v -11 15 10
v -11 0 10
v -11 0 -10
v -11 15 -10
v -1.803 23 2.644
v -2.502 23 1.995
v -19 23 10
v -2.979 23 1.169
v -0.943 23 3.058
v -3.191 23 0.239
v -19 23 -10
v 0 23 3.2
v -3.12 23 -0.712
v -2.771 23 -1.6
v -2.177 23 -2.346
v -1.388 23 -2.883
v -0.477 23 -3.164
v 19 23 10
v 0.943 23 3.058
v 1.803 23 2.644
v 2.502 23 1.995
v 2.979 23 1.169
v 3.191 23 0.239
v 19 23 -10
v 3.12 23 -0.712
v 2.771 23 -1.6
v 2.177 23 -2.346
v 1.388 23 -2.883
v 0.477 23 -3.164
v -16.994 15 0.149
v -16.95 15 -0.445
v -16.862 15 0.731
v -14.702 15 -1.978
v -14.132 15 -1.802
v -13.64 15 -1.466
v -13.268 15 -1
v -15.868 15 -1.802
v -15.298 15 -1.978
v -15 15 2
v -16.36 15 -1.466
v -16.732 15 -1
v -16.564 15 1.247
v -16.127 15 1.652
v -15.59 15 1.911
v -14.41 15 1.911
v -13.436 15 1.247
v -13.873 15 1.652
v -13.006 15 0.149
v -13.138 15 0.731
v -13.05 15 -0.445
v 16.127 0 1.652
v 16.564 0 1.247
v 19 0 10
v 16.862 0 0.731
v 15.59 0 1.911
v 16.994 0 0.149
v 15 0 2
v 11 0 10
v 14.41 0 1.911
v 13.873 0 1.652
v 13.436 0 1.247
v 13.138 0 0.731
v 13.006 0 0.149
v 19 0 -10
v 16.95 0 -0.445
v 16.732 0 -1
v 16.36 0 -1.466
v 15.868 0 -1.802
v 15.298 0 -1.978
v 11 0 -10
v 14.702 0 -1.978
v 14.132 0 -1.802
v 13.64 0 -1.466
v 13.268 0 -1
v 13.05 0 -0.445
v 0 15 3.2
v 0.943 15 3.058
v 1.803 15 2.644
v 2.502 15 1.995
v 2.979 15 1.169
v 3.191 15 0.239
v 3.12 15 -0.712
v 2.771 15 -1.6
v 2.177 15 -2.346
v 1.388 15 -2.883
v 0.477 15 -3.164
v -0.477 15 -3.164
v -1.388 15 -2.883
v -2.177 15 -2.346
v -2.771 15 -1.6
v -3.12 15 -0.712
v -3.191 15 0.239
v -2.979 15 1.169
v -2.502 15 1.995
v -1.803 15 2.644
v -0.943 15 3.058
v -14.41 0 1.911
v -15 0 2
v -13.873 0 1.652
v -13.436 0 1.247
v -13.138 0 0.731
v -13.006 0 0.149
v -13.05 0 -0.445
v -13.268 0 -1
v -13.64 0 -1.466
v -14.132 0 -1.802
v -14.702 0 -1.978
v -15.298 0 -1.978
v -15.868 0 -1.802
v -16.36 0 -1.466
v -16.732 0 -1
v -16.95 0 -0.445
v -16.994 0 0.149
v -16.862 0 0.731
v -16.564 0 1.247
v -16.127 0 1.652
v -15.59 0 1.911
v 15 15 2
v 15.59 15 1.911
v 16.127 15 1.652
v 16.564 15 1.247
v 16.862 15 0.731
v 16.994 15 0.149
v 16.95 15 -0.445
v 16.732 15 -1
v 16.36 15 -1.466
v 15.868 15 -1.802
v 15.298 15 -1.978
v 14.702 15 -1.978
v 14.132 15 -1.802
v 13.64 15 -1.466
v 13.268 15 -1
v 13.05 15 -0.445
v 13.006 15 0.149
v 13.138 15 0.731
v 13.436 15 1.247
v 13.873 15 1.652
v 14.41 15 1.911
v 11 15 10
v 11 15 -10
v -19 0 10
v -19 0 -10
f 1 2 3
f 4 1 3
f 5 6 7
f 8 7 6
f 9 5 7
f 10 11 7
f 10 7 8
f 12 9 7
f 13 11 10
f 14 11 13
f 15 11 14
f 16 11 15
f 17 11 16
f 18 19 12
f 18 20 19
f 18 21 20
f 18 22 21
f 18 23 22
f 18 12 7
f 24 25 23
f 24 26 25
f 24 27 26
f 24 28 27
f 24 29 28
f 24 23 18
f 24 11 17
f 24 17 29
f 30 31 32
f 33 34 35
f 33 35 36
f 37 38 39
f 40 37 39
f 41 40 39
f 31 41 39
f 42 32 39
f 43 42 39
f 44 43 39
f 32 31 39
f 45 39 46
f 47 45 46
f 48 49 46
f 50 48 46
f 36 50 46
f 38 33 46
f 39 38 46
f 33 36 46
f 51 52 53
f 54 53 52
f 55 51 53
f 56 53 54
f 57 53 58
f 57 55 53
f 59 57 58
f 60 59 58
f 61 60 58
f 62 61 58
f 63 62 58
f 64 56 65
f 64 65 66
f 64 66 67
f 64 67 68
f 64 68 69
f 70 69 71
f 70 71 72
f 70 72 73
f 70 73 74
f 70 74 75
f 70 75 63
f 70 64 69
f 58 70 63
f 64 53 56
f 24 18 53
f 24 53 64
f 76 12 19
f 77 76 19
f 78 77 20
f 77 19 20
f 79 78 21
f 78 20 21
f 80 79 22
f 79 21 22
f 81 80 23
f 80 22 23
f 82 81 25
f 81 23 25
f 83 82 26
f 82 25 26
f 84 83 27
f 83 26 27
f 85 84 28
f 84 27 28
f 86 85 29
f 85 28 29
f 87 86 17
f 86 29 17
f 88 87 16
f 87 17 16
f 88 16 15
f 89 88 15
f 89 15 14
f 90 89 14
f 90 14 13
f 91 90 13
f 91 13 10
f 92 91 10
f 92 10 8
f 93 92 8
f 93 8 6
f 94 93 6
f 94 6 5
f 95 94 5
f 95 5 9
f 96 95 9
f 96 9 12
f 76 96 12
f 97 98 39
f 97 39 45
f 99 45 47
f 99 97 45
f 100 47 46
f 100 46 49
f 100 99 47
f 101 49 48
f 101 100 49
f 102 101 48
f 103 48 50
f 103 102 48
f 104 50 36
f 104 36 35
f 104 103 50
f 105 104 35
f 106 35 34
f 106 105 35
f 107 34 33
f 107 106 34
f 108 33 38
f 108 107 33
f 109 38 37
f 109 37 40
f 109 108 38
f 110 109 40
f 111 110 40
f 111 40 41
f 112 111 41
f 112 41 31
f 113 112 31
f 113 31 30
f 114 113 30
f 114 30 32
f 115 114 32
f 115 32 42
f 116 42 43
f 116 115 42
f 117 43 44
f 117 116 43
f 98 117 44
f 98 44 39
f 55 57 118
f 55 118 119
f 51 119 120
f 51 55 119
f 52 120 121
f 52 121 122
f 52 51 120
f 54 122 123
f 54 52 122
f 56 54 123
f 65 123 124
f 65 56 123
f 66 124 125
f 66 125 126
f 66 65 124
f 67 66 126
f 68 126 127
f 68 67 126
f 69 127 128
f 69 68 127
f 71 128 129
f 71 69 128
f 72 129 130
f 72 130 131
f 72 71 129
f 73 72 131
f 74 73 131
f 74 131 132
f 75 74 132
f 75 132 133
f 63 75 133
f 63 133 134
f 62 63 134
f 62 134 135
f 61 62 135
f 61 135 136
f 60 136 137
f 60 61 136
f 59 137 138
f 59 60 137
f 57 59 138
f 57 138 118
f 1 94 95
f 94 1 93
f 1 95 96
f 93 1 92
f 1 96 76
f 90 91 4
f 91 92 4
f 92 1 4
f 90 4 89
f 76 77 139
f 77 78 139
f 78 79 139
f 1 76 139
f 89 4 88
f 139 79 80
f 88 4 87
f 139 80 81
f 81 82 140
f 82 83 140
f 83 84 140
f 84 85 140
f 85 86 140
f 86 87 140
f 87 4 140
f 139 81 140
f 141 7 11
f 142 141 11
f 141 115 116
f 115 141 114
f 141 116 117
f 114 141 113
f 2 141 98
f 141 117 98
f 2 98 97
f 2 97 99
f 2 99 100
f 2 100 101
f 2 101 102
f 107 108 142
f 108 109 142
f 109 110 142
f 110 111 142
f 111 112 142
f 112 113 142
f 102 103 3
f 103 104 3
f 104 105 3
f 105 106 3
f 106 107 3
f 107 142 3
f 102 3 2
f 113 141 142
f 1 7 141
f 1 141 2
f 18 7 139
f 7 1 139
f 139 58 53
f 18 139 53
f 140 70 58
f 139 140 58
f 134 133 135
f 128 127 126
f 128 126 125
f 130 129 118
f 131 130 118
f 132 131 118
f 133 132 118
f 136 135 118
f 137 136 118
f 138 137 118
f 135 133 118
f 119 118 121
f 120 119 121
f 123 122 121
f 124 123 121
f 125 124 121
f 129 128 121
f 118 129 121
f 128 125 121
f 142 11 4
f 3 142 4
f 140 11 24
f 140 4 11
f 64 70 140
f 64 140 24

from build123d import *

# Parameters (mm, degrees)
ESQUISSE1_W             = 8
ESQUISSE1_H             = 20
BOSS_EXTRU_1_DEPTH      = 15
BOSS_EXTRU_1_2_DEPTH    = 15
ESQUISSE3_W             = 38
ESQUISSE3_H             = 20
BOSS_EXTRU_2_DEPTH      = 8
ESQUISSE4_R             = 3.2
ENL_V_MAT_EXTRU_1_DEPTH = 10
ESQUISSE1_3_R           = 2
ENL_V_MAT_EXTRU_3_DEPTH = 15


with BuildPart() as part:
    # Esquisse1 → Boss.-Extru.1 (new body)
    with BuildSketch(Plane(origin=(0, 0, 0), x_dir=(1, 0, 0), z_dir=(0, 1, 0))):
        with Locations((-15, 0)):
            Rectangle(ESQUISSE1_W, ESQUISSE1_H)
    extrude(amount=BOSS_EXTRU_1_DEPTH)



with BuildPart() as body_2:
    # Esquisse1 → Boss.-Extru.1 2 (new body)
    with BuildSketch(Plane(origin=(0, 0, 0), x_dir=(1, 0, 0), z_dir=(0, 1, 0))):
        with Locations((15, 0)):
            Rectangle(ESQUISSE1_W, ESQUISSE1_H)
    extrude(amount=BOSS_EXTRU_1_2_DEPTH)


with BuildPart() as part_1:
    add(part.part)

    add(body_2.part)  # Boss.-Extru.2 merges body 2
    # Esquisse3 → Boss.-Extru.2 (add)
    with BuildSketch(Plane(origin=(0, 15, 0), x_dir=(1, 0, 0), z_dir=(0, 1, 0))):
        Rectangle(ESQUISSE3_W, ESQUISSE3_H)
    extrude(amount=BOSS_EXTRU_2_DEPTH)

    # Esquisse4 → Enlèv. mat.-Extru.1 (cut)
    with BuildSketch(Plane(origin=(0, 23, 0), x_dir=(1, 0, 0), z_dir=(0, 1, 0))):
        Circle(ESQUISSE4_R)
    extrude(amount=-ENL_V_MAT_EXTRU_1_DEPTH, mode=Mode.SUBTRACT)

    # Esquisse1<3> → Enlèv. mat.-Extru.3 (cut)
    with BuildSketch(Plane(origin=(0, 0, 0), x_dir=(1, 0, 0), z_dir=(0, 1, 0))):
        with Locations((-15, 0)):
            Circle(ESQUISSE1_3_R)
        with Locations((15, 0)):
            Circle(ESQUISSE1_3_R)
    extrude(amount=ENL_V_MAT_EXTRU_3_DEPTH, mode=Mode.SUBTRACT)


solid = part_1.part
